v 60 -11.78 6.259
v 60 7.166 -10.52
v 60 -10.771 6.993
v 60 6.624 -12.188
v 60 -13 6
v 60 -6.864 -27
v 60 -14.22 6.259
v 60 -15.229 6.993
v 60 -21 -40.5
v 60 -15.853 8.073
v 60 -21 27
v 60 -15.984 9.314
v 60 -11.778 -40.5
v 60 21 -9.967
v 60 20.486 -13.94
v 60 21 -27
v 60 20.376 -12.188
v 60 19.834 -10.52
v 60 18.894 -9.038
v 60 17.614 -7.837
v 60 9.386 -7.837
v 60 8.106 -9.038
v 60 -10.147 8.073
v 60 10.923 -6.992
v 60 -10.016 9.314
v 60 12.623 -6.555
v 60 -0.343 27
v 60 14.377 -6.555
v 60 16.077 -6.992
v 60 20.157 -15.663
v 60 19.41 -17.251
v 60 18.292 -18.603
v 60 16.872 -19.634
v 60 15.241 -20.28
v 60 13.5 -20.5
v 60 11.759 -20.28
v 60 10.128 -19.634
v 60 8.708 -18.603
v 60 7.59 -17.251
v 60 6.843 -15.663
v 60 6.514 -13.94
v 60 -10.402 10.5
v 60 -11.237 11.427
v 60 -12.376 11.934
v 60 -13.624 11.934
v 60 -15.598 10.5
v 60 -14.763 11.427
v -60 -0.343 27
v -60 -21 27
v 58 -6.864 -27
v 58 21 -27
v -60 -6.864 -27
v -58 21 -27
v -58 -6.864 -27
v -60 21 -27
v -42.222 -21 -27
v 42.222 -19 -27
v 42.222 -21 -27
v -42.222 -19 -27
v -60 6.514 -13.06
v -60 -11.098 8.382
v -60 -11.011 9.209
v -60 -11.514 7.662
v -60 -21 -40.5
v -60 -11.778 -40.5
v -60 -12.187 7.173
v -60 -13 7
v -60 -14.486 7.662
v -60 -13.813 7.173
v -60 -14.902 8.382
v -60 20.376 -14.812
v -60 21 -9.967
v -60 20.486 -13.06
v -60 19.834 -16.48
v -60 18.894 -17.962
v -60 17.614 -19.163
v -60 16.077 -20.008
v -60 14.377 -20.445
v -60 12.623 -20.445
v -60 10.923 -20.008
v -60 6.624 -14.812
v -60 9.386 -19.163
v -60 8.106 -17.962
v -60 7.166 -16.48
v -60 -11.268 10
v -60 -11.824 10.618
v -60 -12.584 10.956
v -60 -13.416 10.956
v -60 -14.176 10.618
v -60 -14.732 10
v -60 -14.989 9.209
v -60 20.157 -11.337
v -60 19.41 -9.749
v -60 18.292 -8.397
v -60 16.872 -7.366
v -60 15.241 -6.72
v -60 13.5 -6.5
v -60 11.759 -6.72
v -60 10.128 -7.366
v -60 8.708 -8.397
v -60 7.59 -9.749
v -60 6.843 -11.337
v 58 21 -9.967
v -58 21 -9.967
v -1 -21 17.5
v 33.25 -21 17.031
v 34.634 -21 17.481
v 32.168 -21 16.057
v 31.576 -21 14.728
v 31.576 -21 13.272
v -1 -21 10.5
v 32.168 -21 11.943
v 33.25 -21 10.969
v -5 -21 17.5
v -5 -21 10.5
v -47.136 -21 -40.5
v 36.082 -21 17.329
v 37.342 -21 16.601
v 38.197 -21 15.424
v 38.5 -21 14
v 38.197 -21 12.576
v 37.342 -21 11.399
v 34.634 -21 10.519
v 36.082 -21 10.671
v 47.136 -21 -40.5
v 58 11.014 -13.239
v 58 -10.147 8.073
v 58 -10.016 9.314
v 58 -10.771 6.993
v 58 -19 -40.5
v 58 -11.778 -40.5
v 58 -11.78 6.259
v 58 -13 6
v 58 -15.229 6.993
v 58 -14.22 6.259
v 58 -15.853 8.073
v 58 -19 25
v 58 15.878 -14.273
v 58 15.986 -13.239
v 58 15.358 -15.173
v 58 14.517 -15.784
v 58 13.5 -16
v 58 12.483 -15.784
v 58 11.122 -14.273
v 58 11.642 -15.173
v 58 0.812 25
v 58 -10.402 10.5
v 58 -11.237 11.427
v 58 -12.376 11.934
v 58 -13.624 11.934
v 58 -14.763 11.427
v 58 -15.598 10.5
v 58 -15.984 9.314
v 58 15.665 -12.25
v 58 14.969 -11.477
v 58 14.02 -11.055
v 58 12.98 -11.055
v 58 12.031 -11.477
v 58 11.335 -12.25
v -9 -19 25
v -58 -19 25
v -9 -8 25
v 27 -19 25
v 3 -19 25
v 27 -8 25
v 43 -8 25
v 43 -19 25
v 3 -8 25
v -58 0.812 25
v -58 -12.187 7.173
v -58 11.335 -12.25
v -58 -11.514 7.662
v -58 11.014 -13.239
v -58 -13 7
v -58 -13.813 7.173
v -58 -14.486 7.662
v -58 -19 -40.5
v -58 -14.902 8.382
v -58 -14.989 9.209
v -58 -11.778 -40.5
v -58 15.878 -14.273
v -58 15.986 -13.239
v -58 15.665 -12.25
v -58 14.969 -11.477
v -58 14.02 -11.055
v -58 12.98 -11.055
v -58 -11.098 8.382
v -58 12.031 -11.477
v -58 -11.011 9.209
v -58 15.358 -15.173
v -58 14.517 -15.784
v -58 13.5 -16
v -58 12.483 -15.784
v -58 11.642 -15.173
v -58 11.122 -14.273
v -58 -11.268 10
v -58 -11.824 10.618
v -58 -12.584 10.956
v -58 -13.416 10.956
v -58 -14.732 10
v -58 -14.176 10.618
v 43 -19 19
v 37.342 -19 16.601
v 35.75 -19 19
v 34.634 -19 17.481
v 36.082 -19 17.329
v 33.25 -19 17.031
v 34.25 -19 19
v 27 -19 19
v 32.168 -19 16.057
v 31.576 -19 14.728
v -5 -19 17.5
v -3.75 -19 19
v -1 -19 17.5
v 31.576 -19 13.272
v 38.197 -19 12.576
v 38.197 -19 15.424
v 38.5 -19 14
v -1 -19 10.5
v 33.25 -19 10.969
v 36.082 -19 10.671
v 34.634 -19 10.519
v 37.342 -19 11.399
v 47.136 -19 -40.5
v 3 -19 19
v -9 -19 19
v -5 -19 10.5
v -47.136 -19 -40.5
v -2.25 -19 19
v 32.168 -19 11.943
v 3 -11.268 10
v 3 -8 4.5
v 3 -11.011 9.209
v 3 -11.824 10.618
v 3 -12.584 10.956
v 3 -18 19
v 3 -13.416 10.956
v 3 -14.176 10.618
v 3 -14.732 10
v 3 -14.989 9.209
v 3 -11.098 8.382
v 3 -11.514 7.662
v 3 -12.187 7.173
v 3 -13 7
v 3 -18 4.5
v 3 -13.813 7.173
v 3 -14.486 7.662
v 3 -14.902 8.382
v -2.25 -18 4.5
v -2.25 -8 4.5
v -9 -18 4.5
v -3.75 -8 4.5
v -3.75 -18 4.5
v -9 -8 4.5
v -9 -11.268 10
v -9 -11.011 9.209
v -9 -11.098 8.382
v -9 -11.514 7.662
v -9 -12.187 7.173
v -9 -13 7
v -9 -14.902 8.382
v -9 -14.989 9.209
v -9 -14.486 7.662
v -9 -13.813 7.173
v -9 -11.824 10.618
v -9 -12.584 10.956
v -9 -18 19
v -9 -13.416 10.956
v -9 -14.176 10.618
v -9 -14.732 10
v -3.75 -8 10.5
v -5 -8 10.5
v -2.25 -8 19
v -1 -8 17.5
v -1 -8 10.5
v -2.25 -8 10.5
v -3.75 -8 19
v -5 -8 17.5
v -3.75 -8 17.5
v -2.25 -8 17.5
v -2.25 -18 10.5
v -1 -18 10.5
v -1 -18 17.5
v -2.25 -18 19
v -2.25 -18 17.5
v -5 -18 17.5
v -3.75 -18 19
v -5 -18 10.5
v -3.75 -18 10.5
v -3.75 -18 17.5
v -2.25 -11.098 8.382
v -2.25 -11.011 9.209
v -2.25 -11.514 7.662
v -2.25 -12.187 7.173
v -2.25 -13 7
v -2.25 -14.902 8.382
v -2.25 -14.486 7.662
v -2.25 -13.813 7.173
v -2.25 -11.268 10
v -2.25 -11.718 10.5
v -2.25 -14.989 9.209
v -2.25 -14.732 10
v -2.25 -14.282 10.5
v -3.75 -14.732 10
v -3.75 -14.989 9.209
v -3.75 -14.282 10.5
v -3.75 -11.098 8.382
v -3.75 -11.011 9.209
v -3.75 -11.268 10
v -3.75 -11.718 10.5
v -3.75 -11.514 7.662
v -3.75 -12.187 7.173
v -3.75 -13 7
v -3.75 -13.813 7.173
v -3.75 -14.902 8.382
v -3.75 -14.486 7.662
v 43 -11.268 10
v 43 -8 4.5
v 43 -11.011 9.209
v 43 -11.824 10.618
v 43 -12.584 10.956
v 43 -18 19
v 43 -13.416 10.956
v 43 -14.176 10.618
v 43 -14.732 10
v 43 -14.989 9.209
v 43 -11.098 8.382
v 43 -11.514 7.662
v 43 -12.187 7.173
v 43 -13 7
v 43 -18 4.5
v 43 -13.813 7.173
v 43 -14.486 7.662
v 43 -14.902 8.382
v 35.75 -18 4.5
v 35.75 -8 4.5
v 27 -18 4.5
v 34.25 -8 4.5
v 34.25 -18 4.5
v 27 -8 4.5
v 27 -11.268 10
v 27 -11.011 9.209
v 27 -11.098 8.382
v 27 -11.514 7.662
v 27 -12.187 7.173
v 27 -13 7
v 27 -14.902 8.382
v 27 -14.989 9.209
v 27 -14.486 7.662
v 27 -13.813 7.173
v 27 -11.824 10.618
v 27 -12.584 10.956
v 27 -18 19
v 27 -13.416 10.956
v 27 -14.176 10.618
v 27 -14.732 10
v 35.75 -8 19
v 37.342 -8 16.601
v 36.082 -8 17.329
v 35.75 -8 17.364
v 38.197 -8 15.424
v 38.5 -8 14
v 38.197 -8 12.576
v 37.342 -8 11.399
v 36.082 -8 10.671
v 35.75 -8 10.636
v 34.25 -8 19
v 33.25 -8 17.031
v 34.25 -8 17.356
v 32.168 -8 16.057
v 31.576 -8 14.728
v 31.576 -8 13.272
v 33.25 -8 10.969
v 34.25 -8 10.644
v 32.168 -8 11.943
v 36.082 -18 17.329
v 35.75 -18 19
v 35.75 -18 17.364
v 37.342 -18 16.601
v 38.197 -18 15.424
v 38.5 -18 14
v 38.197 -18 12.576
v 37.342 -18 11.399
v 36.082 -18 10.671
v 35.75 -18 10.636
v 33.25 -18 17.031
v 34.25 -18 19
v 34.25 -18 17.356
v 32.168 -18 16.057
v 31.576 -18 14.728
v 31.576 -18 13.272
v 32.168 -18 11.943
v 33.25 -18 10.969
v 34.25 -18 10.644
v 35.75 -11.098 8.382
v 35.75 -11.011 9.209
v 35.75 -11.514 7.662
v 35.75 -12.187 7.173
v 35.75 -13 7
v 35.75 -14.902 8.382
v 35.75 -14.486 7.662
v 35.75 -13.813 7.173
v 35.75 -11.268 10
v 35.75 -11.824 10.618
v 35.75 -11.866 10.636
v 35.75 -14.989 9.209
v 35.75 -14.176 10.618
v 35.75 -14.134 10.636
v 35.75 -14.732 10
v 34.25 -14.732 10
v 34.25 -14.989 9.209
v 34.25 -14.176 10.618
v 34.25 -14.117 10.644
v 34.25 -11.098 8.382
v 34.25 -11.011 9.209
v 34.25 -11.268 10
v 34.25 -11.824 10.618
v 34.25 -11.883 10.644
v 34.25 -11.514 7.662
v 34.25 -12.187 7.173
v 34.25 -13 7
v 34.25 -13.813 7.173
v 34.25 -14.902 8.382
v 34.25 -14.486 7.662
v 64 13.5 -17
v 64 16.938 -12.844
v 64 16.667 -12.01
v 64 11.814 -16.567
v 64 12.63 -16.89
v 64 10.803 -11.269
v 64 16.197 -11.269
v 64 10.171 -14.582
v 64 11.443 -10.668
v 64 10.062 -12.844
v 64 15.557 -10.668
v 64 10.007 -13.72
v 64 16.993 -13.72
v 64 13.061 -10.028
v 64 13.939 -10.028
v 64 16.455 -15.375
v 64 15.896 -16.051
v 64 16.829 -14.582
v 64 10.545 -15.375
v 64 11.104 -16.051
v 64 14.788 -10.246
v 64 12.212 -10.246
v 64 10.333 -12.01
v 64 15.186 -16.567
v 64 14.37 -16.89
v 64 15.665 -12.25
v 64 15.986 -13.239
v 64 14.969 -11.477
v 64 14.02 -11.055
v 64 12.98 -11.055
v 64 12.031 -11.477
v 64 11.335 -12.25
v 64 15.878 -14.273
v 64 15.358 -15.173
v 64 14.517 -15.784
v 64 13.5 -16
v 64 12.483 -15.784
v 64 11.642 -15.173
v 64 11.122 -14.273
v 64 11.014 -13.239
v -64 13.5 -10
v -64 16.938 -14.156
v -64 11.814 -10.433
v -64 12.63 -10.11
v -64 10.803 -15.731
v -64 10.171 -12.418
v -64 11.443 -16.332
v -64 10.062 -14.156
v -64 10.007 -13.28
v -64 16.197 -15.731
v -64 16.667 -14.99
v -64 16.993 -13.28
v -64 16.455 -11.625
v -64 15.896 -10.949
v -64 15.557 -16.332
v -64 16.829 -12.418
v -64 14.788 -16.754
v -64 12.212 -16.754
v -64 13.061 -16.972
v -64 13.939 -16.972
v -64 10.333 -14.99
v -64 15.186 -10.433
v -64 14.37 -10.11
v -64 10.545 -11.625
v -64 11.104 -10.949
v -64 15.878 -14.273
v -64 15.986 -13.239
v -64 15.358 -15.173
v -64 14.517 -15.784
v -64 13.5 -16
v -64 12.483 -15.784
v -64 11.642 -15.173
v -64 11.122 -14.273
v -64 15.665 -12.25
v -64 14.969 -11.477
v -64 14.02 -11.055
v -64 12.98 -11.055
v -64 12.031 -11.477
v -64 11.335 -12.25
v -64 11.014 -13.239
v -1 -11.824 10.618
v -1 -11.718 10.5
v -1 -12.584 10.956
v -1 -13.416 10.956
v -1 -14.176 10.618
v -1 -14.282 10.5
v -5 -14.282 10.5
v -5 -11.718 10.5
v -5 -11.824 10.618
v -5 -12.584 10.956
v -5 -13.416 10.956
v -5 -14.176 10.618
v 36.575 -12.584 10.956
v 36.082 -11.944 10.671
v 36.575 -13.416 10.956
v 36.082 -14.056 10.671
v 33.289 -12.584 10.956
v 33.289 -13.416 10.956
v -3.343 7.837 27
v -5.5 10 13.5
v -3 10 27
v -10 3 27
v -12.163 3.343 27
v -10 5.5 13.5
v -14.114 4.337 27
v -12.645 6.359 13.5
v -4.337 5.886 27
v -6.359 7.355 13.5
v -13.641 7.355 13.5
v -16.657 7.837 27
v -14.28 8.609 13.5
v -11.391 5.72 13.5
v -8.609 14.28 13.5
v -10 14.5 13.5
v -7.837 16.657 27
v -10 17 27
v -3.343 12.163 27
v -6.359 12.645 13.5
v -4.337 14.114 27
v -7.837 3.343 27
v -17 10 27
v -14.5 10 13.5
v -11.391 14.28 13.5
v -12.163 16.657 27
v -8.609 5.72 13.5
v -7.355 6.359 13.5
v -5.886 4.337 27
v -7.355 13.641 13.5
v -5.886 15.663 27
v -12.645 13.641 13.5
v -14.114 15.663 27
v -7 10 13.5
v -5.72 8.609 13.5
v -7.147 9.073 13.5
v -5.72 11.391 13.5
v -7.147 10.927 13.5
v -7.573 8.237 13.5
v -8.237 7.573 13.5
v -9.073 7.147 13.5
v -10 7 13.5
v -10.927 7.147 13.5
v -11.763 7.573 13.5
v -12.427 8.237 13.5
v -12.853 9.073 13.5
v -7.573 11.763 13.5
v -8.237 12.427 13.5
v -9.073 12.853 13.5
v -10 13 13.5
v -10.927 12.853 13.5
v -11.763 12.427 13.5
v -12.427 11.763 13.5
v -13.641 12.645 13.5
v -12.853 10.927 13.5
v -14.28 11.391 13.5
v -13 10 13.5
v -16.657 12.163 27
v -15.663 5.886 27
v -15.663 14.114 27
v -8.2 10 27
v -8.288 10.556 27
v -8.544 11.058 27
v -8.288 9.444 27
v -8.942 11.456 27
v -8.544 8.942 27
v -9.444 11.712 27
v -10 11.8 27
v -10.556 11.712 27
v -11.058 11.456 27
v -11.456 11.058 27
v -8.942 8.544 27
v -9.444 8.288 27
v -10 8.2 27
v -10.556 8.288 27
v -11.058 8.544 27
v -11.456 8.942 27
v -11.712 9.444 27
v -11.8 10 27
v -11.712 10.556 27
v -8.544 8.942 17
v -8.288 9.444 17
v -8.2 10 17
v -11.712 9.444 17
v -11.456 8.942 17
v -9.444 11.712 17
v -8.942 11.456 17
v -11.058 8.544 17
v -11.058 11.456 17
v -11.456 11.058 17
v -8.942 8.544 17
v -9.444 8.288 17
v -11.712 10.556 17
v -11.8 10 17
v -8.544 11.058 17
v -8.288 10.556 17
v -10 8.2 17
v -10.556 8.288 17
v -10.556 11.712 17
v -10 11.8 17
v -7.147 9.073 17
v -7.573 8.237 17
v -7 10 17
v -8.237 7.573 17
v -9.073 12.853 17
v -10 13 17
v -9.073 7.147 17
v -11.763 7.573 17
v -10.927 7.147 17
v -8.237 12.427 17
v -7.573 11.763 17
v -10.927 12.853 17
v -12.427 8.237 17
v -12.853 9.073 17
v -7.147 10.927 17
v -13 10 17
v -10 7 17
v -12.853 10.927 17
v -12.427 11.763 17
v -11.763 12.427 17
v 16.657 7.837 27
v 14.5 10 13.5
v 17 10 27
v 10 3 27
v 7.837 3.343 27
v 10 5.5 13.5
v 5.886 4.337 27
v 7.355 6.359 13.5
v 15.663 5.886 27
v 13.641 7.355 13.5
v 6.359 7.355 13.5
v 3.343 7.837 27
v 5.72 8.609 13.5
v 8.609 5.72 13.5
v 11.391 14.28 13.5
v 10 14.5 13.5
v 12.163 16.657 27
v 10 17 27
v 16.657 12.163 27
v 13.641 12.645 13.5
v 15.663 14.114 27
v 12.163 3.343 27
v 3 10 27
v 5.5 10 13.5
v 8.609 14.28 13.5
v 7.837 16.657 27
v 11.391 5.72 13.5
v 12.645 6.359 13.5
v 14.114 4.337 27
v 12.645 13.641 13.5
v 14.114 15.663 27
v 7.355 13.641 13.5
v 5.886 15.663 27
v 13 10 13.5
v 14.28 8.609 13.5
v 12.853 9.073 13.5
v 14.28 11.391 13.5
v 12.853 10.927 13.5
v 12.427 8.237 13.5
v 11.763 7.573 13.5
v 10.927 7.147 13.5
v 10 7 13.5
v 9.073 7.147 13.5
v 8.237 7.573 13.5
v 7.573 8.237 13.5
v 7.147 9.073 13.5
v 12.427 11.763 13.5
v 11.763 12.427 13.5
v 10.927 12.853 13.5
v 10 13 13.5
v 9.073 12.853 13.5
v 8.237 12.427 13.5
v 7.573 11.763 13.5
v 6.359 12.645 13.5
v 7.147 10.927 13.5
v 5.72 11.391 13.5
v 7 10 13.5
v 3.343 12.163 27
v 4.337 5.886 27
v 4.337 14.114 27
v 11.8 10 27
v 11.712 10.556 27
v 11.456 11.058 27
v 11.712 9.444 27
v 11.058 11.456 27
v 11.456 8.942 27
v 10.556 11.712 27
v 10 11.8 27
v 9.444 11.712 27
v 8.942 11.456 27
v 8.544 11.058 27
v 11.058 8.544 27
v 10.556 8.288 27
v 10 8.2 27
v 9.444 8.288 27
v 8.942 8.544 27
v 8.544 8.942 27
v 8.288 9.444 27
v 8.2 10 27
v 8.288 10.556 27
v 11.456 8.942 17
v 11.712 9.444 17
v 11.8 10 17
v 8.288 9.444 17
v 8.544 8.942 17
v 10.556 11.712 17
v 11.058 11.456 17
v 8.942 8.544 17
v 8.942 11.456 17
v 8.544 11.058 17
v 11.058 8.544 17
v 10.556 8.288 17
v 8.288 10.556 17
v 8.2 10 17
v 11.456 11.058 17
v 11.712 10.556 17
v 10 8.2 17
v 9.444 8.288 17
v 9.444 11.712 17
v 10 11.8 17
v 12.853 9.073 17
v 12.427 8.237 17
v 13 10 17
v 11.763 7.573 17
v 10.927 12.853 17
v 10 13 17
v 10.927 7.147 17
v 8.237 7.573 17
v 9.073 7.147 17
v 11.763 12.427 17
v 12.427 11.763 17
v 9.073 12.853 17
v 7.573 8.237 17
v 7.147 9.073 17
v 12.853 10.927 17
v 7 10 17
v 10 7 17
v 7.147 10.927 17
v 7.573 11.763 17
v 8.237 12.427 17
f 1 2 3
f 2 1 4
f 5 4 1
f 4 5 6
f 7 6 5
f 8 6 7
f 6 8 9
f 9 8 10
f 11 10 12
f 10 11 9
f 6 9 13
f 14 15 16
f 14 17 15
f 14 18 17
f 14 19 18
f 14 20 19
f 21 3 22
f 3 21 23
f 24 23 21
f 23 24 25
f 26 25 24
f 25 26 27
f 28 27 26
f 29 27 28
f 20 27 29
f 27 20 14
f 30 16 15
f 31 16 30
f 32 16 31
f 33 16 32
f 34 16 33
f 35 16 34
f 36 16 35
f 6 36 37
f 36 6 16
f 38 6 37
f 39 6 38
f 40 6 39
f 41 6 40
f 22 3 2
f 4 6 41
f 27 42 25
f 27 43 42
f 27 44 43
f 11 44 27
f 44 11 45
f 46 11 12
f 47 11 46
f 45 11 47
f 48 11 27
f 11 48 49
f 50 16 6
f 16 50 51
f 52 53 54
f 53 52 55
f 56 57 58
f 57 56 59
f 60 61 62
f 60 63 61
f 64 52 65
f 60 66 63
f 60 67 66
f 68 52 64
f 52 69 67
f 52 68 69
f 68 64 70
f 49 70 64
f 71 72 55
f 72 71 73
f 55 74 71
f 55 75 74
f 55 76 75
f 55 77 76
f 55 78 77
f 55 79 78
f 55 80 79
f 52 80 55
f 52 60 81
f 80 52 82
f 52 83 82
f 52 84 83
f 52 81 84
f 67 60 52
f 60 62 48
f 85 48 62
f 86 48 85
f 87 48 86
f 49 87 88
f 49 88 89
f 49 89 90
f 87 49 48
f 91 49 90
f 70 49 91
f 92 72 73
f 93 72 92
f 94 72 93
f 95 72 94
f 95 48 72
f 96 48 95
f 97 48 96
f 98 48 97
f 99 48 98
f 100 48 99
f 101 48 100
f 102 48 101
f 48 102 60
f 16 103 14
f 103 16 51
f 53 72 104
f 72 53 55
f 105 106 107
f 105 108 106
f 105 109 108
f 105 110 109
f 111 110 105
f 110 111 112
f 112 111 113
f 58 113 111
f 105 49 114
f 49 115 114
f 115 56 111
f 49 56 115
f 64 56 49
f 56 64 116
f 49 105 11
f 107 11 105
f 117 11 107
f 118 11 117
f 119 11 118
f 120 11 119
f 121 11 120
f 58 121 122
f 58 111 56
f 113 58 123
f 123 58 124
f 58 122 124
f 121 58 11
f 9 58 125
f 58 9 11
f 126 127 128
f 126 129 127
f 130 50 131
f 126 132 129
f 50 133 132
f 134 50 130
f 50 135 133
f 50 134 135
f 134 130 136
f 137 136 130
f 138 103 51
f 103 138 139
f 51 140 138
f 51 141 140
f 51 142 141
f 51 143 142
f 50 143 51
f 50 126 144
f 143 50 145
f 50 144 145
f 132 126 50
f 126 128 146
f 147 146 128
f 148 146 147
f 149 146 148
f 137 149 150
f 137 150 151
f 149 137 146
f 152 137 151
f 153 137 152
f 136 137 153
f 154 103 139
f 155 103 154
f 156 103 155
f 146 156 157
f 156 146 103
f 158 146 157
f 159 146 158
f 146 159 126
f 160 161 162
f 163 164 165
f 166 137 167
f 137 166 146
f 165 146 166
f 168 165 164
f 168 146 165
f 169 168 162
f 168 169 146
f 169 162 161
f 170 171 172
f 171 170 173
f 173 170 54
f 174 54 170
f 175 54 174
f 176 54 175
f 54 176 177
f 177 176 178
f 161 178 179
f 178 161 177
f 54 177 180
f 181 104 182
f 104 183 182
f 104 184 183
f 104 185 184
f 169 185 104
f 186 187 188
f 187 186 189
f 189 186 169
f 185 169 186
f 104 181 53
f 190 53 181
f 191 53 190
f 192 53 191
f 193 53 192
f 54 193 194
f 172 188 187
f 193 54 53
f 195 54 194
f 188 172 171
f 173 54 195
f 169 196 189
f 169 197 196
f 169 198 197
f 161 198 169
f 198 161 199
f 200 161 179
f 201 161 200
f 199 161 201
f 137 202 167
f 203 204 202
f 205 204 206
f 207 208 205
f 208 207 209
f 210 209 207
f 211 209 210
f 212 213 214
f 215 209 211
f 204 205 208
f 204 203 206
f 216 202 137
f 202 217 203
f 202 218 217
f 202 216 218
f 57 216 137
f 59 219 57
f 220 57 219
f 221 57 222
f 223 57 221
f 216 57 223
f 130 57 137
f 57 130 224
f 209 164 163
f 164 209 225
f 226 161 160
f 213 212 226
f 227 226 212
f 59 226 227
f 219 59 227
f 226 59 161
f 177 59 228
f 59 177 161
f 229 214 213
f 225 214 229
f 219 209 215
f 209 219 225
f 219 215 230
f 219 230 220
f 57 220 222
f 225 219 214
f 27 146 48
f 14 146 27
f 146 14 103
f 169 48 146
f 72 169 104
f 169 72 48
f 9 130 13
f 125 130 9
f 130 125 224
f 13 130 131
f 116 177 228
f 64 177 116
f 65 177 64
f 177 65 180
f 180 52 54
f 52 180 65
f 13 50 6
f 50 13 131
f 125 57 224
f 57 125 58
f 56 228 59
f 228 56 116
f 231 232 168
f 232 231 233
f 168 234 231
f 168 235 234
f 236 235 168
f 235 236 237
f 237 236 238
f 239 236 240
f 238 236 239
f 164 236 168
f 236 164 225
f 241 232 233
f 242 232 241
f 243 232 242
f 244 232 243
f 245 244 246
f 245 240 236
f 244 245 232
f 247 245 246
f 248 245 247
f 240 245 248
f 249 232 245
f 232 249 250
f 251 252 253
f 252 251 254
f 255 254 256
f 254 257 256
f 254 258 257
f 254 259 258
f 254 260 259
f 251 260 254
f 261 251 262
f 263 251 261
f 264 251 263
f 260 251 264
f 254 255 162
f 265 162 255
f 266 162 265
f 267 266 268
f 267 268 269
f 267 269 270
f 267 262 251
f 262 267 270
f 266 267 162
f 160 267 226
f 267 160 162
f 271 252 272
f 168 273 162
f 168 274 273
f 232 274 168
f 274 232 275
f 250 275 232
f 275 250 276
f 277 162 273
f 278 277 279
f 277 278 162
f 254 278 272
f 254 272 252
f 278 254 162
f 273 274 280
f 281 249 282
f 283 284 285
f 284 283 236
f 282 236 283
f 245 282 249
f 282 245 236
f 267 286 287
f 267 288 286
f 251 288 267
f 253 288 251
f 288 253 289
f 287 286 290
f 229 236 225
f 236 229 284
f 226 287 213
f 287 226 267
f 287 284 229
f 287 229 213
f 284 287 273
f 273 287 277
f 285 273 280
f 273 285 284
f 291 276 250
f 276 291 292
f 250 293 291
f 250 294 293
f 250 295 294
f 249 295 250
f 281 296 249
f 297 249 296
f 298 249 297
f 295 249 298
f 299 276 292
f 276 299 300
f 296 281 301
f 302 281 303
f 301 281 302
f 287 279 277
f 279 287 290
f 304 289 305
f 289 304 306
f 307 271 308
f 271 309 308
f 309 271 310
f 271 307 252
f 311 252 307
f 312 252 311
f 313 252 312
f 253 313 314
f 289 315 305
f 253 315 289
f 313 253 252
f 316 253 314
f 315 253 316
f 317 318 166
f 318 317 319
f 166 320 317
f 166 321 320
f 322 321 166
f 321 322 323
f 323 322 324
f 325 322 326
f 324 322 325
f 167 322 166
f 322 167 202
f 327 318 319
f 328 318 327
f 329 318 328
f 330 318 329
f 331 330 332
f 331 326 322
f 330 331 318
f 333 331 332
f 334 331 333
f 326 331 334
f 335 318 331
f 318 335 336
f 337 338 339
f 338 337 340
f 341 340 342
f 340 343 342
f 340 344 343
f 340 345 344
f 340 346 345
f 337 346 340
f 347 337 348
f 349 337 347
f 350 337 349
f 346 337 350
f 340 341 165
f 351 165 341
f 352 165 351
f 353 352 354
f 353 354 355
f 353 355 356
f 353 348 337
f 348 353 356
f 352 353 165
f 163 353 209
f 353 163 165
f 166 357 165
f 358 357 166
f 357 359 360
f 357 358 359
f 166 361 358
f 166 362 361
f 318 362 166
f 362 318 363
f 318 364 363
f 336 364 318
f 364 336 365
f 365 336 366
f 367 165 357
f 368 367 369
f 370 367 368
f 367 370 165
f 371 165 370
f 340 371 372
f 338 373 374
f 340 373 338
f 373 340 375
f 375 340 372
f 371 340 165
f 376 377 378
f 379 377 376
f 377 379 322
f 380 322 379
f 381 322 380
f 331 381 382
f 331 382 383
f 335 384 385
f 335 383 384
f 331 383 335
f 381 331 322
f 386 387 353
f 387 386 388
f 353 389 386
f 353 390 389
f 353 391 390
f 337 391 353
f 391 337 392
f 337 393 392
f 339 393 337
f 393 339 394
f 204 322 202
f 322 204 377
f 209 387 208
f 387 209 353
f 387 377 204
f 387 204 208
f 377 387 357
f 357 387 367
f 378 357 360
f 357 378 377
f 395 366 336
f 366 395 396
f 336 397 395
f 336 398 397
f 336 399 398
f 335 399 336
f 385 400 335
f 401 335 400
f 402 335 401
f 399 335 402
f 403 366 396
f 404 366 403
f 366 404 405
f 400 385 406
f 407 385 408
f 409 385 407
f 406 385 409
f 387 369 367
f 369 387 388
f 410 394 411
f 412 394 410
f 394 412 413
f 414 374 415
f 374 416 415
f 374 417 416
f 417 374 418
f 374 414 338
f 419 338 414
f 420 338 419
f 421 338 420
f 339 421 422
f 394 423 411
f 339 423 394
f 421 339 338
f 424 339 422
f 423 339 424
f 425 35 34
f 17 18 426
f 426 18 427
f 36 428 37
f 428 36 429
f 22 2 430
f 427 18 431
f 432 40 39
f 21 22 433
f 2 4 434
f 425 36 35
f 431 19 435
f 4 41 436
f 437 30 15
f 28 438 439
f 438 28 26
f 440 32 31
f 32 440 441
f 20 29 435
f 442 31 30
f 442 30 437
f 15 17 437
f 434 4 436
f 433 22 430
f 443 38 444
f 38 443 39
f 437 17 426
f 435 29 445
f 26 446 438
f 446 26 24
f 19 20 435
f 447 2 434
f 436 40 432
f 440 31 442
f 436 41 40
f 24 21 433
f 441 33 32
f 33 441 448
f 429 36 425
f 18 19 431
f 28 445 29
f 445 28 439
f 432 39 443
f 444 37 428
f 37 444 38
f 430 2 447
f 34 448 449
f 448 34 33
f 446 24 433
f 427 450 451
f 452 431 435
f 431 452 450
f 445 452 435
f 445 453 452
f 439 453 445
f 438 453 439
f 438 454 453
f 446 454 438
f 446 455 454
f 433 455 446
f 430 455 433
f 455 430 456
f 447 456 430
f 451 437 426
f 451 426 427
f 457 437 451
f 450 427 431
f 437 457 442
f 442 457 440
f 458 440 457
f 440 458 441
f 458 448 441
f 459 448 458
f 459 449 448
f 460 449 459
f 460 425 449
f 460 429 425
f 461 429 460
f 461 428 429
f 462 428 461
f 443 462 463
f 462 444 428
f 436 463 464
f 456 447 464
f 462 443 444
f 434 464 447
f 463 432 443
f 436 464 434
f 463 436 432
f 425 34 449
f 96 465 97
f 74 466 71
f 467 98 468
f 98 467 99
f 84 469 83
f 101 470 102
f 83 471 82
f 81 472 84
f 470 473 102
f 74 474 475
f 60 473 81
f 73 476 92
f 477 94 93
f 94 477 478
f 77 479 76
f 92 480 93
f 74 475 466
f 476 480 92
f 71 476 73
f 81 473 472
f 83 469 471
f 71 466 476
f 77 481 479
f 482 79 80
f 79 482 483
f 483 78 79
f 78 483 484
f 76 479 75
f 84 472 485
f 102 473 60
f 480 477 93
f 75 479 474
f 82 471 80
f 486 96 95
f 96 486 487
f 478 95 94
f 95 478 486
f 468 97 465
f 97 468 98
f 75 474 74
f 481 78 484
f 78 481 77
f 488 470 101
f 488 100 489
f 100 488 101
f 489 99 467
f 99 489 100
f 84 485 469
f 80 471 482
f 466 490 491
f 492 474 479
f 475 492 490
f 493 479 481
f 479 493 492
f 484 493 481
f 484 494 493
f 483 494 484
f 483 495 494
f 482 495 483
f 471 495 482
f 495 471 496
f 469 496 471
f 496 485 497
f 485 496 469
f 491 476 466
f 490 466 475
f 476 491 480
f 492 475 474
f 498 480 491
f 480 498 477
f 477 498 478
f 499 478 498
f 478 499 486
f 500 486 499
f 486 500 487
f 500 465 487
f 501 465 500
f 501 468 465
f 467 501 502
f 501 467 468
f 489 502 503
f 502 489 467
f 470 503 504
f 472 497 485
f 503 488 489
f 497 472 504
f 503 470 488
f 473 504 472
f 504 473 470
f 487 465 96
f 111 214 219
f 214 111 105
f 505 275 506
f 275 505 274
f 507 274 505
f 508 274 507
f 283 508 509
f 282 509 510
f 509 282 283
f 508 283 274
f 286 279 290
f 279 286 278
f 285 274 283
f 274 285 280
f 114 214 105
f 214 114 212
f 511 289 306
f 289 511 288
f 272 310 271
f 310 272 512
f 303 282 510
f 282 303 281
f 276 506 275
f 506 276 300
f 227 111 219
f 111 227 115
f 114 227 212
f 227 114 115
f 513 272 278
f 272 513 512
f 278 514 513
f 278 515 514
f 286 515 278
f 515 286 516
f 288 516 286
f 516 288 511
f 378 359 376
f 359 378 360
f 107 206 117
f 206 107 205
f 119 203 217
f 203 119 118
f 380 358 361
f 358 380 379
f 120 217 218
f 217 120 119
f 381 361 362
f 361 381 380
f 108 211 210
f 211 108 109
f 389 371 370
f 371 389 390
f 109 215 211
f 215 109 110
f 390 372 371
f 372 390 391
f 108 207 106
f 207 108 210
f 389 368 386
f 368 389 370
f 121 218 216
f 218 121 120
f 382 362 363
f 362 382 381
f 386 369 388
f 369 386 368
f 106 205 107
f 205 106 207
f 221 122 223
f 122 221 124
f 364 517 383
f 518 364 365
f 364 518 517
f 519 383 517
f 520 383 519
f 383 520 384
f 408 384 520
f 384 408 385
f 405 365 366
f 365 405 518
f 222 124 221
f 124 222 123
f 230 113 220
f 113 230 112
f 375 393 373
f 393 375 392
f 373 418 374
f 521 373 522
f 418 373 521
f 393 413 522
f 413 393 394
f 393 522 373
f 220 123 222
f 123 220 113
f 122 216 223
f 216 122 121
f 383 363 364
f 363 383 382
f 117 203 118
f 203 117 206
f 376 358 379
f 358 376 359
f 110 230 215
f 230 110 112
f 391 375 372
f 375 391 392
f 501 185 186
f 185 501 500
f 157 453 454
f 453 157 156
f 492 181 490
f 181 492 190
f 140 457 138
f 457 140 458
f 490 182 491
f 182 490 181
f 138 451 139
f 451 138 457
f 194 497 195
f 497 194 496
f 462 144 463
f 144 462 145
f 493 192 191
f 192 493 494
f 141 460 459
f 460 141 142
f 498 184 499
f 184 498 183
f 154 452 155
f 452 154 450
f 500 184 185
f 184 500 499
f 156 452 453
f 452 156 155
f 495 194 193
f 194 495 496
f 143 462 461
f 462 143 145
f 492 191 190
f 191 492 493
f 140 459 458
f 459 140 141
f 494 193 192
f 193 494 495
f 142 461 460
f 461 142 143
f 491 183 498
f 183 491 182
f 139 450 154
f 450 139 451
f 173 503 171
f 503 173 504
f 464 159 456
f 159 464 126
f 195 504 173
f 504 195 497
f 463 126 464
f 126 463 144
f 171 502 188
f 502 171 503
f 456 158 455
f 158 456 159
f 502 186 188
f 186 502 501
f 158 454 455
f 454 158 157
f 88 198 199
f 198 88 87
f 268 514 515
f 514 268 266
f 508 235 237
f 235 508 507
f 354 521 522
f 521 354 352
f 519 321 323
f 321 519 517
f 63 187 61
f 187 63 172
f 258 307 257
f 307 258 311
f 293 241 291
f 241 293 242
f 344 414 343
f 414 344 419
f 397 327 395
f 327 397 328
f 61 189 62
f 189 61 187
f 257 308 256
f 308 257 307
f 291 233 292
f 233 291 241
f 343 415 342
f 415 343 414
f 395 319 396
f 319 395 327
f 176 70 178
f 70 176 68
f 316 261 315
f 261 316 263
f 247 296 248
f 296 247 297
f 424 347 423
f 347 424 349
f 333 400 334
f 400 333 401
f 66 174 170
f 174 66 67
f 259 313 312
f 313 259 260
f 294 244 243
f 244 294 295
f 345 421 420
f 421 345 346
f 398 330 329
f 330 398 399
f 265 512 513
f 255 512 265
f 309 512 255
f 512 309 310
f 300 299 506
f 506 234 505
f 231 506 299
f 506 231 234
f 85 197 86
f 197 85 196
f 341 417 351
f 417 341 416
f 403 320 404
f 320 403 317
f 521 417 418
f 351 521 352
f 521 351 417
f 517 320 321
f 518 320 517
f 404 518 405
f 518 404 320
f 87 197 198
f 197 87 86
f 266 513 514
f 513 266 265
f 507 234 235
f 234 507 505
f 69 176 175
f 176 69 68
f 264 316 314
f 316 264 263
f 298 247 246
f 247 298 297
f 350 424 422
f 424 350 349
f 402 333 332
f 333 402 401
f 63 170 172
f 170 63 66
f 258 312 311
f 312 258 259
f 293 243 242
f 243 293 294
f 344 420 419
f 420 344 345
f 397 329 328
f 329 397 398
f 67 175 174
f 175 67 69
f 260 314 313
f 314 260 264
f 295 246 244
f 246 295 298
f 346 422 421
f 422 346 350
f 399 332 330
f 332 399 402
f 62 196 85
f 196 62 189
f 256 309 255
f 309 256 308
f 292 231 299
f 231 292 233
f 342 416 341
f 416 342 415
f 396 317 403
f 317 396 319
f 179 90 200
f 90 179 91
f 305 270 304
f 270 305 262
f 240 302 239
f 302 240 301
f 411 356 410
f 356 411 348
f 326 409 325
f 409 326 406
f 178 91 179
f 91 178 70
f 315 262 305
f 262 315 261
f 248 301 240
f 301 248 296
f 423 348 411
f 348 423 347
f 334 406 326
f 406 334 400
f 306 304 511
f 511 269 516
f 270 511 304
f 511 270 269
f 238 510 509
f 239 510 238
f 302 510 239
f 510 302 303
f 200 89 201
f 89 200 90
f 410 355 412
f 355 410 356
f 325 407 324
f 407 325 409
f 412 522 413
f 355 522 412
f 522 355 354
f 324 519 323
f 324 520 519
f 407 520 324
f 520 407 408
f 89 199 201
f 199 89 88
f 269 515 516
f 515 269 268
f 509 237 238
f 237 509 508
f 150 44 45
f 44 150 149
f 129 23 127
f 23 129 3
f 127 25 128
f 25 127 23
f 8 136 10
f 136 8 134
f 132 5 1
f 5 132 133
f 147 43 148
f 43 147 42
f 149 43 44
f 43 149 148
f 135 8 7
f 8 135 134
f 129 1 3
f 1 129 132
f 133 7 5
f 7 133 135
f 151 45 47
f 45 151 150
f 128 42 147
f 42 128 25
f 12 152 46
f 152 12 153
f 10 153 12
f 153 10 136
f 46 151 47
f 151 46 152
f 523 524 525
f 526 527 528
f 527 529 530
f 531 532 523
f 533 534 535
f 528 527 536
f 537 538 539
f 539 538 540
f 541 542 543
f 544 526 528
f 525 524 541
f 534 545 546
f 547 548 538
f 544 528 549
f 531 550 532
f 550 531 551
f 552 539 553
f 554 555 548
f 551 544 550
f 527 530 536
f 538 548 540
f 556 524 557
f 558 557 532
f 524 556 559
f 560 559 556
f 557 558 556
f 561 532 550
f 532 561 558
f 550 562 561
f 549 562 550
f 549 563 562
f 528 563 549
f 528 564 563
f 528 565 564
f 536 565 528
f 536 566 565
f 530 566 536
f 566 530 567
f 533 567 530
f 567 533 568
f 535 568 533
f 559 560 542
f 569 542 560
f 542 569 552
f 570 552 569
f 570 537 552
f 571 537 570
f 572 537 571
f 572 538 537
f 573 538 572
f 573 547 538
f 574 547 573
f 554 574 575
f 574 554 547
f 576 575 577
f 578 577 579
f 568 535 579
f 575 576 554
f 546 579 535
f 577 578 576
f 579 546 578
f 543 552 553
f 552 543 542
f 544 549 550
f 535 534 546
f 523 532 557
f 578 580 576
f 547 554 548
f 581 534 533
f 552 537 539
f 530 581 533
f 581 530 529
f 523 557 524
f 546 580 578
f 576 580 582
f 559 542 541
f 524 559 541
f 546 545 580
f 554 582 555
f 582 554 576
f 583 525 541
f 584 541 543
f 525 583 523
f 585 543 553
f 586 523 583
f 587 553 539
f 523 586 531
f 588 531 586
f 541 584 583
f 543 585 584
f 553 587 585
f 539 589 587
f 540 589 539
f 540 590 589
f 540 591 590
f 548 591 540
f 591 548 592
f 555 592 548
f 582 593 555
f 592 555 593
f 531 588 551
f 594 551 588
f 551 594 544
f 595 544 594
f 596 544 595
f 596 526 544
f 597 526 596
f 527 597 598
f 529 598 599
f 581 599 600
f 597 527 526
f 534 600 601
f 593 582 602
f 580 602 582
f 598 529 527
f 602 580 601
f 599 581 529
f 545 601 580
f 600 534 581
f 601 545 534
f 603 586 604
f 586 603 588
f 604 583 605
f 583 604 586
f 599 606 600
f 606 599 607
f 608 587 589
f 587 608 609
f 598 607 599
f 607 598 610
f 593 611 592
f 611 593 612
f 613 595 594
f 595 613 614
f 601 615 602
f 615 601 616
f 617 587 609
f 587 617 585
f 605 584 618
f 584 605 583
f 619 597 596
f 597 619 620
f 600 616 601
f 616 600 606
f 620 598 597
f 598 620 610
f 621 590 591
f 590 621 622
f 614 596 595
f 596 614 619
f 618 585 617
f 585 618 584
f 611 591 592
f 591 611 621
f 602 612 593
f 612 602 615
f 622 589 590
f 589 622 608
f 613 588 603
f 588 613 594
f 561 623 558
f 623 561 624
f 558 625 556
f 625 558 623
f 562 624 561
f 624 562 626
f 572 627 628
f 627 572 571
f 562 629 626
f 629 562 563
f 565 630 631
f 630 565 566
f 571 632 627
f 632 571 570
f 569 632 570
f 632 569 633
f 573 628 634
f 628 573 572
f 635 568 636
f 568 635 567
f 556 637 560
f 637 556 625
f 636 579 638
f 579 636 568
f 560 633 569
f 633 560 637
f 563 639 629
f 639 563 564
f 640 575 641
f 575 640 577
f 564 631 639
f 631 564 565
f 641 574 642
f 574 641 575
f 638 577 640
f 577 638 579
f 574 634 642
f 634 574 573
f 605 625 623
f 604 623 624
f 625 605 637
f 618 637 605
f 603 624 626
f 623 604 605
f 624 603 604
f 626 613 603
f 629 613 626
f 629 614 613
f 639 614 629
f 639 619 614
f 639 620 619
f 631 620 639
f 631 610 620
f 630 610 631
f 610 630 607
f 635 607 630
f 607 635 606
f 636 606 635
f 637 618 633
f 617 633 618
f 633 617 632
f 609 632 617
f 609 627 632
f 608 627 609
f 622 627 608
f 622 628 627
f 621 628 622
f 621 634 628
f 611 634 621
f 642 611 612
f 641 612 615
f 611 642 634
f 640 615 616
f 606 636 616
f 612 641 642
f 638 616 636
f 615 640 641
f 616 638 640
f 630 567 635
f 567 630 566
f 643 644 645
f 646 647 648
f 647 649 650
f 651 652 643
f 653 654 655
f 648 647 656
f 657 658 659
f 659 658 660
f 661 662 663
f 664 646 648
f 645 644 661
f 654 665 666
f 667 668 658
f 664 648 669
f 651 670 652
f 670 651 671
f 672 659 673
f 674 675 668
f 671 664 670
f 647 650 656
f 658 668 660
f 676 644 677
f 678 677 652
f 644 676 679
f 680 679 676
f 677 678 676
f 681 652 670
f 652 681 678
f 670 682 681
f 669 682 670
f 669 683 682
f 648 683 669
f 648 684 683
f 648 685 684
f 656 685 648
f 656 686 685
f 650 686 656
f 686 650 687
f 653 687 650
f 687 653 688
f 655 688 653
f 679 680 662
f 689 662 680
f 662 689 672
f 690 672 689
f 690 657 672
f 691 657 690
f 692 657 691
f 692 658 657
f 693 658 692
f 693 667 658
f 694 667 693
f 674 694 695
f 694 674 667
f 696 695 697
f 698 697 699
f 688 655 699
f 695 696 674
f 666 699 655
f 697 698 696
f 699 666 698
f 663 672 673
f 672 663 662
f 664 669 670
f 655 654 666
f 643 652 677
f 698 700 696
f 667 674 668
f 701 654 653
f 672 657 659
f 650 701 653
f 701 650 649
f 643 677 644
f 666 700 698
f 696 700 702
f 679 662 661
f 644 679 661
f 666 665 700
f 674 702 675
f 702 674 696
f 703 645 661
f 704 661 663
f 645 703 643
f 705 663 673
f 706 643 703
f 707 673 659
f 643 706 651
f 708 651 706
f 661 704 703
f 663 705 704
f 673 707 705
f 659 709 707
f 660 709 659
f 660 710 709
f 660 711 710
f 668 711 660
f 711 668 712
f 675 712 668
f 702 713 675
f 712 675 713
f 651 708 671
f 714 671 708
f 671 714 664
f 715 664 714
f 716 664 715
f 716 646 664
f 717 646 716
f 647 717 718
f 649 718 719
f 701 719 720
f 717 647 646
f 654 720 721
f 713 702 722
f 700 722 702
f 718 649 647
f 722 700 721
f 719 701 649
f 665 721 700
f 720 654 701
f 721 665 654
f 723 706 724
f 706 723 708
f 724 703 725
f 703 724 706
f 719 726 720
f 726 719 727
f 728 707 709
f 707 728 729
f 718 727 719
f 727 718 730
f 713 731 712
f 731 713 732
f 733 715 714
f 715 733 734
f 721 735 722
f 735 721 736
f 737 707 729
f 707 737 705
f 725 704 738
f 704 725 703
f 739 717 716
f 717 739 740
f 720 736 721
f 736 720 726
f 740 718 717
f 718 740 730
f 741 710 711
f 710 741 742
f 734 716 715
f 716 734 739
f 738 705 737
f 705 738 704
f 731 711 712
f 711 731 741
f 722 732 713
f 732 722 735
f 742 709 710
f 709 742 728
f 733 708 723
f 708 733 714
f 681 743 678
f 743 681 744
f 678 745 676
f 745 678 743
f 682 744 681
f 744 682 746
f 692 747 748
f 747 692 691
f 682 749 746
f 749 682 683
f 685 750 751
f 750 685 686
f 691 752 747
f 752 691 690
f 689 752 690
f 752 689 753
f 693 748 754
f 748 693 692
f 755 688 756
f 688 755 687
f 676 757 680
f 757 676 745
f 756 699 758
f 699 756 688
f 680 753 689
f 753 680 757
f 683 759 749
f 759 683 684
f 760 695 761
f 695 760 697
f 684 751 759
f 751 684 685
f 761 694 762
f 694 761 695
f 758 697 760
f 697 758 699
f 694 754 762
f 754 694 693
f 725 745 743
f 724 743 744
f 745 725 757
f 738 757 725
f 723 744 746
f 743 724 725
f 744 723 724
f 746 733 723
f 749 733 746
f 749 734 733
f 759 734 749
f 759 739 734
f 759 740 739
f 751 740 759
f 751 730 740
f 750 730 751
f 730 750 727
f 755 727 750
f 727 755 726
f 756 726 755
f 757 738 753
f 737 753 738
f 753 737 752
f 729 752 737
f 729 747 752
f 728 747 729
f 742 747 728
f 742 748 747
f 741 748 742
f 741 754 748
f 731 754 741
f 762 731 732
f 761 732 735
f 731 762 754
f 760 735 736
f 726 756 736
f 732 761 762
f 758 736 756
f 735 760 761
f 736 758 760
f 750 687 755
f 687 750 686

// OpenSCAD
twelve_v=[-3,0,14];
mains=[35,0,14];
screw_holes=[0,13.5,-13.5];
clamp_holes=[0,-13,9];
right=[0,21,0];
top=[0,0,25];
foot_height=13.5;


module cable_clamp(tx=9)
{
	difference()
	{
		union()
		{
			translate([0,0,-1])
				cube([tx,10,21], center=true);
			translate([0,-4.5,6.5])
				cube([tx,4,7], center=true);
		}
		translate([0,-4.5,-12])
				cube([1.5,30,30], center=true);
	}
}

module ps_cover()
{

	difference()
	{
		union()
		{
			difference()
			{
				cube([120,42,54], center=true);
				translate([0,5,-5])
					cube([116,48,60], center=true);
				translate([0,47,5])
					rotate([30,0,0])
						cube([130,60,120], center=true);
			}

			difference()
			{
				translate([0,-12,-(27+foot_height/2)])
					difference()
					{
						cube([120,18,foot_height], center=true);
						translate([0,8,0])
							rotate([-20,0,0])
								cube([130,10,2*foot_height], center=true);
					}
				translate([0,-9.5,-(27+foot_height/2)])
					cube([116,19,foot_height], center=true);
				translate([0,-16,-(27+foot_height/2)])
					difference()
					{
						cube([100,10,foot_height], center=true);
						translate([50,0,0])
							rotate([0,-20,0])
								cube([10,20,2*foot_height], center=true);
						translate([-50,0,0])
							rotate([0,20,0])
								cube([10,20,2*foot_height], center=true);
					}
			}

			translate(twelve_v-right+[0,8,2])
				cable_clamp(tx=12);
			translate(mains-right+[0,8,2])
				cable_clamp(tx=16);
			translate(screw_holes+[62,0,0])
				rotate([0,90,0])
					cylinder(h=4,r1=7,r2=3.5,center=true,$fn=25);
			translate(screw_holes-[62,0,0])
				rotate([0,-90,0])
					cylinder(h=4,r1=7,r2=3.5,center=true,$fn=25);
		}

		translate(twelve_v)
			cube([4,148,7], center=true);
		
		translate(mains)
			rotate([90,0,0])
				cylinder(h=200,r=3.5,center=true,$fn=15);
		
		translate(screw_holes)
			rotate([0,90,0])
				cylinder(h=200,r=2.5,center=true,$fn=15);

		translate(clamp_holes)
			rotate([0,90,0])
				cylinder(h=200,r=2,center=true,$fn=15);

		translate(clamp_holes + [80,0,0])
			rotate([0,90,0])
				cylinder(h=50,r=3,center=true,$fn=15);
	}
}

module ps_foot()
{
	difference()
	{
		cylinder(h=foot_height,r1=7,r2=4.5,center=true,$fn=20);
		cylinder(h=foot_height,r=1.8,center=true,$fn=20);
		translate([0,0,foot_height/2-3.5/2])
			cylinder(h=foot_height-10,r=3,center=true,$fn=20);
	}
}


ps_cover();
translate([-10, 10, 20.25]) rotate([180, 0, 0]) ps_foot();
translate([10, 10, 20.25]) rotate([180, 0, 0]) ps_foot();
